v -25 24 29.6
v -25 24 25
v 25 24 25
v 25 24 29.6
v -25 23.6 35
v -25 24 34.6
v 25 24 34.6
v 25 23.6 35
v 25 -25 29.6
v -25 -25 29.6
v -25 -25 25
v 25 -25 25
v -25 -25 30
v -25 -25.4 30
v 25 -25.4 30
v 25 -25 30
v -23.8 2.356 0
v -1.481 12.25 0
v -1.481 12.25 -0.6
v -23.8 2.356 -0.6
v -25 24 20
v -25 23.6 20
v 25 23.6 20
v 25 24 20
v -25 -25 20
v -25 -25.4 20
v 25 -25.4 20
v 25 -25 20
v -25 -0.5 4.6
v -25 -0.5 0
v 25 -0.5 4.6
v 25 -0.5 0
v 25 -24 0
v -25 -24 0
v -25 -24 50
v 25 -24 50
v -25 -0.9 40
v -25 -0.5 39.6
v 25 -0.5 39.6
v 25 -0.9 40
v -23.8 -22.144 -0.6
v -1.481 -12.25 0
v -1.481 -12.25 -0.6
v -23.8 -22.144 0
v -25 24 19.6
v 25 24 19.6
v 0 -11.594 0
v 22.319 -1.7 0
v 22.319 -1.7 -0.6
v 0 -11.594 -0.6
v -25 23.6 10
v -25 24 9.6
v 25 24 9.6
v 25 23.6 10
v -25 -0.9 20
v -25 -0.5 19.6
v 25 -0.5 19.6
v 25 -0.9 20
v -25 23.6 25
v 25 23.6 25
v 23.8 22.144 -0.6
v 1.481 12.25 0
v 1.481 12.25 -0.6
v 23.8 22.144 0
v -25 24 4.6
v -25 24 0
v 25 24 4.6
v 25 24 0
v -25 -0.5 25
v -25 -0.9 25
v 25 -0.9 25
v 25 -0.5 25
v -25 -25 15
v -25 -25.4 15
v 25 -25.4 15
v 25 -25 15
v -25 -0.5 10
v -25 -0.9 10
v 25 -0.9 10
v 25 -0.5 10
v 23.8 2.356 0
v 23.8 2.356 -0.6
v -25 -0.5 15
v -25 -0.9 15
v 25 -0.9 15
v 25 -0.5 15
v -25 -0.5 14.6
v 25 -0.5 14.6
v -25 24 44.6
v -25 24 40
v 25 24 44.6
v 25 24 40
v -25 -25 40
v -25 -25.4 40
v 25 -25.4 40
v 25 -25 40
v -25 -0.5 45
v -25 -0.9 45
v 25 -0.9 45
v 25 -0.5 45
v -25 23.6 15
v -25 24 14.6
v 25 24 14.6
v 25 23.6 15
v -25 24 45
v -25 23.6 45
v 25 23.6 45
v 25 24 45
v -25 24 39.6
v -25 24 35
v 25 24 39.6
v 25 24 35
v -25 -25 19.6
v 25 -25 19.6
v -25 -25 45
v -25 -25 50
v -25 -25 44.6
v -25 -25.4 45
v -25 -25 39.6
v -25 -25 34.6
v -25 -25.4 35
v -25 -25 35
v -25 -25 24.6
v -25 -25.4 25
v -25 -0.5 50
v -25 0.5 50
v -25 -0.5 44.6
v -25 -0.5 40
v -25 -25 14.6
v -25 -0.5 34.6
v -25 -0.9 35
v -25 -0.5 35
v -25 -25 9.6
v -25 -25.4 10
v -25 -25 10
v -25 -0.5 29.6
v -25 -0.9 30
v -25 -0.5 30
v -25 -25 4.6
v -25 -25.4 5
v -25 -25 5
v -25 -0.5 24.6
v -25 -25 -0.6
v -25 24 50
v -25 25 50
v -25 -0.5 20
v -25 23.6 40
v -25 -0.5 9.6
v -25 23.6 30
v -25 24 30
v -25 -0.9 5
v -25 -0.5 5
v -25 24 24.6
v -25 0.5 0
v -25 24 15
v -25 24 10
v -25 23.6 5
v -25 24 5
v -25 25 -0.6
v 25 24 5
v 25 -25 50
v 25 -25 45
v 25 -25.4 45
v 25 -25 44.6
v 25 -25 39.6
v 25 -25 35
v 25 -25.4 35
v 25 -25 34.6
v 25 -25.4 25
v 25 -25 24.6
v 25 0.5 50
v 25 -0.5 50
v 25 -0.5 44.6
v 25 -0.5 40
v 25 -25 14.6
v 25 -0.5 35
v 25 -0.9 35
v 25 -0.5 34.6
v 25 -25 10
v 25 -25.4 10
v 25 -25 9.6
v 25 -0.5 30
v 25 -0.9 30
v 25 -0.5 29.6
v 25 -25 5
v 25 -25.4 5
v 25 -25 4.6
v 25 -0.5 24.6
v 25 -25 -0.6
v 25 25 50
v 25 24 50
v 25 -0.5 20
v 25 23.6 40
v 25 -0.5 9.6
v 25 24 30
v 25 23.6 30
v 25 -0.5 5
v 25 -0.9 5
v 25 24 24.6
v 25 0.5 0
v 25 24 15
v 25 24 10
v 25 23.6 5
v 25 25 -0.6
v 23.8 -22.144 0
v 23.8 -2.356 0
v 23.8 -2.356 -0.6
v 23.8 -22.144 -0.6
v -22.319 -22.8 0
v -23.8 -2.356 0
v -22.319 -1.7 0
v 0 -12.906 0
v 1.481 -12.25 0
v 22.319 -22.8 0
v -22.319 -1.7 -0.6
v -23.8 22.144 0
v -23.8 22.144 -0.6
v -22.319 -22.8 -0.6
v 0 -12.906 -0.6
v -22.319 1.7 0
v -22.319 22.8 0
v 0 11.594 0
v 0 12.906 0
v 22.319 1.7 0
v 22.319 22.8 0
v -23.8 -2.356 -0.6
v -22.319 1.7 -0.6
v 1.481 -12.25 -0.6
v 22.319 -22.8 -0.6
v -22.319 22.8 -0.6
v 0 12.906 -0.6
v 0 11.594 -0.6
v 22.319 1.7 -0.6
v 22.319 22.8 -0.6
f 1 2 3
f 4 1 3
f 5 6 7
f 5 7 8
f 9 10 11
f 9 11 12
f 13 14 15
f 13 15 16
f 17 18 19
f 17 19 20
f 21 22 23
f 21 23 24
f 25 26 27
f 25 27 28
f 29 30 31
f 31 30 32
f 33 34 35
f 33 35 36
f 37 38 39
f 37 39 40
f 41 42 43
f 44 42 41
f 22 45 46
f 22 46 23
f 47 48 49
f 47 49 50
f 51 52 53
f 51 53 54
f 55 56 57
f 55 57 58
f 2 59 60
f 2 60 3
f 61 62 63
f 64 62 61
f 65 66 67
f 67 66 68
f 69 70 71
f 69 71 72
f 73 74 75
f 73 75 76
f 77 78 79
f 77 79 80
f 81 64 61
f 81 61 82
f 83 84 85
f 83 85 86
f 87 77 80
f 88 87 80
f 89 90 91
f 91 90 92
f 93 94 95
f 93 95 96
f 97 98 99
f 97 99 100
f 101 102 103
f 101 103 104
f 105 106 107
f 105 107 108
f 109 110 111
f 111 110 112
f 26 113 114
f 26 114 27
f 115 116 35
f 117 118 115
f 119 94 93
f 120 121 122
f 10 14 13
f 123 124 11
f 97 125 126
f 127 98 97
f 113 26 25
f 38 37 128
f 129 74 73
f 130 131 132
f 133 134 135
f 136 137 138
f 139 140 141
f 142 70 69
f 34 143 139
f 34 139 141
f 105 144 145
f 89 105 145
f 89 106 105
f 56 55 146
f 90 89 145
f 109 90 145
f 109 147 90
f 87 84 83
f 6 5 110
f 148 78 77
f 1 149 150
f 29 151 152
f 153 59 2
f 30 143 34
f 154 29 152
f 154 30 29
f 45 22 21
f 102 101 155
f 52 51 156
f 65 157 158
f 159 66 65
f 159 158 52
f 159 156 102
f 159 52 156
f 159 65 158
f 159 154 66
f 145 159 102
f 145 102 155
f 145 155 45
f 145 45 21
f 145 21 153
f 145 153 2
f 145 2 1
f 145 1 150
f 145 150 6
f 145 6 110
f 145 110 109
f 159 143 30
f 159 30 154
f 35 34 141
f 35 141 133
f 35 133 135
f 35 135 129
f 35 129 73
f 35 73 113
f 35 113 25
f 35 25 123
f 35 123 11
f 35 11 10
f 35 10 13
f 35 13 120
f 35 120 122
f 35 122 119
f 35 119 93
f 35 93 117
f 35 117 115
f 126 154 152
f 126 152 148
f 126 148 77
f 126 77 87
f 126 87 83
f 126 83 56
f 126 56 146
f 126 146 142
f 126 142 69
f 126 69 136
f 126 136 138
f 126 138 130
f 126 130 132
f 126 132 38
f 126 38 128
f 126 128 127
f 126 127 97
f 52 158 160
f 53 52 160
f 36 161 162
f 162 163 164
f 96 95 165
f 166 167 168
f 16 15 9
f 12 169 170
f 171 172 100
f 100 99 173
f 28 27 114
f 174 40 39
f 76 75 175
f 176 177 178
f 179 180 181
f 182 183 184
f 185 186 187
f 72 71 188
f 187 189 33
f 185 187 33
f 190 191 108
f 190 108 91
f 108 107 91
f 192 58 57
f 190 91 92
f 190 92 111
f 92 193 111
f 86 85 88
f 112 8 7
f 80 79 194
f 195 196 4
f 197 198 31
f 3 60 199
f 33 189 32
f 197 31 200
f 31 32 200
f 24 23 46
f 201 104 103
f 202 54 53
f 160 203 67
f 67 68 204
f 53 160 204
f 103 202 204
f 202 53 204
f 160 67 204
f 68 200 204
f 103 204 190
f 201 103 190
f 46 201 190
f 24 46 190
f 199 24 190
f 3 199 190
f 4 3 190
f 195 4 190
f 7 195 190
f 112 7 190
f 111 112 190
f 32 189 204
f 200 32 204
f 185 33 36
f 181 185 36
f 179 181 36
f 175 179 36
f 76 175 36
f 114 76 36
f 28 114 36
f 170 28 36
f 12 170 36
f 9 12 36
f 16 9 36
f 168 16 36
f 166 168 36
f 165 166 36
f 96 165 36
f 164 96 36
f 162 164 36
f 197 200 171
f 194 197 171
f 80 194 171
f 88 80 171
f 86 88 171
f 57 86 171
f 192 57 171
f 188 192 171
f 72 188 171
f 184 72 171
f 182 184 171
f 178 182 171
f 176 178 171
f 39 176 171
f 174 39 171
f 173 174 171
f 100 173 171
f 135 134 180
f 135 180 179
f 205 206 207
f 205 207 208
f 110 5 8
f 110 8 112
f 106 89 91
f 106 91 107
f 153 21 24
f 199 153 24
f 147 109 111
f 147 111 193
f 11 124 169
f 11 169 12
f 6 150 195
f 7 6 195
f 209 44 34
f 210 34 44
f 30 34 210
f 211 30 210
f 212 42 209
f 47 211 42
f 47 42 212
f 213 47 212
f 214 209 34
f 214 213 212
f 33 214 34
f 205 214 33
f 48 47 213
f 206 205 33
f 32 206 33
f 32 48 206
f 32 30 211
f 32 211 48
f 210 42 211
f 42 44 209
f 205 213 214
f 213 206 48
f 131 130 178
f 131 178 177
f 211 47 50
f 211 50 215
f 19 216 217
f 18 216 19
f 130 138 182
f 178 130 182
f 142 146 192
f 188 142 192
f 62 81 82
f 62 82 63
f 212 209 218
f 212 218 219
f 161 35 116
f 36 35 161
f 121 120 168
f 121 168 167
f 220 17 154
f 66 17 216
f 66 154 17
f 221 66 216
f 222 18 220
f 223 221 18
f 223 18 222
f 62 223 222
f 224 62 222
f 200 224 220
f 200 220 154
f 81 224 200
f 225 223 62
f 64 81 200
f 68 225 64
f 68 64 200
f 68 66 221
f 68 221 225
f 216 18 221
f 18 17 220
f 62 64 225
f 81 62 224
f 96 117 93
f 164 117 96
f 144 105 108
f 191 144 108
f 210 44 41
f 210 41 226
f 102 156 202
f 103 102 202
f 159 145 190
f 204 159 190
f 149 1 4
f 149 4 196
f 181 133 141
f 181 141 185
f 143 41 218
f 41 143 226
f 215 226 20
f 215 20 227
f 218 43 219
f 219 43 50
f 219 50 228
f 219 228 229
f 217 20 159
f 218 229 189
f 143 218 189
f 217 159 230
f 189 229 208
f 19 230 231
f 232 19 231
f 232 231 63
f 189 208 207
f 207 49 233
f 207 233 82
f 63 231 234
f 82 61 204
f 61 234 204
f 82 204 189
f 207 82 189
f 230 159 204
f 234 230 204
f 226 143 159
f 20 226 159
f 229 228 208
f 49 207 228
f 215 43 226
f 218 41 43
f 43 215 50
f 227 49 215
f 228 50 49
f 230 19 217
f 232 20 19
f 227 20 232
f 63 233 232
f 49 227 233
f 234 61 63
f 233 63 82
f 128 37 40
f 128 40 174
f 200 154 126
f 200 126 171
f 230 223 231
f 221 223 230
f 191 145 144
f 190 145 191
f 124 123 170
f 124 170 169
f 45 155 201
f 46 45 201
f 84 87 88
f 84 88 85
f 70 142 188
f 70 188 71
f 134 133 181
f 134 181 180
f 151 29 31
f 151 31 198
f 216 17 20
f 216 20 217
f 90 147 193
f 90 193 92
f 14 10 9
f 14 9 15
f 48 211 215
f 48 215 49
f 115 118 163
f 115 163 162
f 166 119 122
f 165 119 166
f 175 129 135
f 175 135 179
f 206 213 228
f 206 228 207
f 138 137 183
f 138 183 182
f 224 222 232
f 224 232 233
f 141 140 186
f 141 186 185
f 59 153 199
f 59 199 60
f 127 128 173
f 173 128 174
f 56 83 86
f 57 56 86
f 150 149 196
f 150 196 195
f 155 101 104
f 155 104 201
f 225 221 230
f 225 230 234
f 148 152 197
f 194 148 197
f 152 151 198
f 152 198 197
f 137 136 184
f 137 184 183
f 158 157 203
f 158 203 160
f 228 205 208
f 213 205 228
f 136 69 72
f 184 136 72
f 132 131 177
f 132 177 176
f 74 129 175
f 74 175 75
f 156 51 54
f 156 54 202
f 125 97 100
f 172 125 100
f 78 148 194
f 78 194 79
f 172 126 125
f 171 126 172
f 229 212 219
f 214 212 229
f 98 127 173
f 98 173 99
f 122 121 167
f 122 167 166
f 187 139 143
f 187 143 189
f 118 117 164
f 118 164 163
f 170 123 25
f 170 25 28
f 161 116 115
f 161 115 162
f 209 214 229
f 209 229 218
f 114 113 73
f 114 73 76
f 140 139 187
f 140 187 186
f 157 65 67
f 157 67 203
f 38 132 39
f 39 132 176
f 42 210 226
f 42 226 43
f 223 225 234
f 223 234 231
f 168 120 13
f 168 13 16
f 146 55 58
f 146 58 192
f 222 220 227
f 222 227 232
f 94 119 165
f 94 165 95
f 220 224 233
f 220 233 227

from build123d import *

# Parameters (mm, degrees)
F0_W     = 50
F0_H     = 23.5
F0_H_2   = 1
F1_DEPTH = 0.6
F2_DEPTH = 50
F4_DEPTH = 50


# Not quite as in the source:
# - a feature names something its author has since deleted; it is built from what else it names


with BuildPart() as f1:
    # F0 (on Top) → F1 (new body)
    with BuildSketch(Plane.XY):
        with Locations((0, 12.25)):
            Rectangle(F0_W, F0_H)
        Polygon((-23.8, 22.1436935786), (-23.8, 22.8), (-22.3194224806, 22.8), (22.3194224806, 22.8), (23.8, 22.8), (23.8, 22.1436935786), (23.8, 2.3563064214), (23.8, 1.7), (22.3194224806, 1.7), (-22.3194224806, 1.7), (-23.8, 1.7), (-23.8, 2.3563064214), align=None, mode=Mode.SUBTRACT)
        with Locations((0, -12.25)):
            Rectangle(F0_W, F0_H)
        Polygon((-22.3194224806, -22.8), (-23.8, -22.8), (-23.8, -22.1436935786), (-23.8, -2.3563064214), (-23.8, -1.7), (-22.3194224806, -1.7), (22.3194224806, -1.7), (23.8, -1.7), (23.8, -2.3563064214), (23.8, -22.1436935786), (23.8, -22.8), (22.3194224806, -22.8), align=None, mode=Mode.SUBTRACT)
        with Locations((0, -24.5)):
            Rectangle(F0_W, F0_H_2)
        Rectangle(F0_W, F0_H_2)
        with Locations((0, 24.5)):
            Rectangle(F0_W, F0_H_2)
        Polygon((-22.3194224806, 22.8), (-23.8, 22.8), (-23.8, 22.1436935786), (-1.4805775194, 12.25), (0, 12.9063064214), align=None)
        Polygon((23.8, 22.8), (22.3194224806, 22.8), (0, 12.9063064214), (1.4805775194, 12.25), (23.8, 22.1436935786), align=None)
        Polygon((1.4805775194, 12.25), (0, 12.9063064214), (-1.4805775194, 12.25), (0, 11.5936935786), align=None)
        Polygon((23.8, 2.3563064214), (1.4805775194, 12.25), (0, 11.5936935786), (22.3194224806, 1.7), (23.8, 1.7), align=None)
        Polygon((-1.4805775194, 12.25), (-23.8, 2.3563064214), (-23.8, 1.7), (-22.3194224806, 1.7), (0, 11.5936935786), align=None)
        Polygon((-23.8, -1.7), (-23.8, -2.3563064214), (-1.4805775194, -12.25), (0, -11.5936935786), (-22.3194224806, -1.7), align=None)
        Polygon((0, -11.5936935786), (-1.4805775194, -12.25), (0, -12.9063064214), (1.4805775194, -12.25), align=None)
        Polygon((22.3194224806, -1.7), (0, -11.5936935786), (1.4805775194, -12.25), (23.8, -2.3563064214), (23.8, -1.7), align=None)
        Polygon((0, -12.9063064214), (22.3194224806, -22.8), (23.8, -22.8), (23.8, -22.1436935786), (1.4805775194, -12.25), align=None)
        Polygon((-23.8, -22.1436935786), (-23.8, -22.8), (-22.3194224806, -22.8), (0, -12.9063064214), (-1.4805775194, -12.25), align=None)
    extrude(amount=-F1_DEPTH)

    # F0 (on Top) → F2 (join)
    with BuildSketch(Plane.XY):
        with Locations((0, 24.5)):
            Rectangle(F0_W, F0_H_2)
        Rectangle(F0_W, F0_H_2)
        with Locations((0, -24.5)):
            Rectangle(F0_W, F0_H_2)
    extrude(amount=F2_DEPTH)

    # F3 (on face) → F4 (join, through all)
    with BuildSketch(Plane(origin=(-25, 0, 0), x_dir=(0, -1, 0), z_dir=(-1, 0, 0))):
        Polygon((-24, 45), (-24, 44.6), (-23.6, 45), align=None)
        Polygon((-24, 40), (-24, 39.6), (-23.6, 40), align=None)
        Polygon((-24, 35), (-24, 34.6), (-23.6, 35), align=None)
        Polygon((-24, 30), (-24, 29.6), (-23.6, 30), align=None)
        Polygon((-24, 25), (-24, 24.6), (-23.6, 25), align=None)
        Polygon((-24, 20), (-24, 19.6), (-23.6, 20), align=None)
        Polygon((-24, 15), (-24, 14.6), (-23.6, 15), align=None)
        Polygon((-24, 10), (-24, 9.6), (-23.6, 10), align=None)
        Polygon((-24, 5), (-24, 4.6), (-23.6, 5), align=None)
        Polygon((0.9, 5), (0.5, 5), (0.5, 4.6), align=None)
        Polygon((0.9, 10), (0.5, 10), (0.5, 9.6), align=None)
        Polygon((0.9, 15), (0.5, 15), (0.5, 14.6), align=None)
        Polygon((0.9, 20), (0.5, 20), (0.5, 19.6), align=None)
        Polygon((0.9, 25), (0.5, 25), (0.5, 24.6), align=None)
        Polygon((0.9, 30), (0.5, 30), (0.5, 29.6), align=None)
        Polygon((0.9, 35), (0.5, 35), (0.5, 34.6), align=None)
        Polygon((0.9, 40), (0.5, 40), (0.5, 39.6), align=None)
        Polygon((0.9, 45), (0.5, 45), (0.5, 44.6), align=None)
        Polygon((25.4, 45), (25, 45), (25, 44.6), align=None)
        Polygon((25.4, 40), (25, 40), (25, 39.6), align=None)
        Polygon((25.4, 35), (25, 35), (25, 34.6), align=None)
        Polygon((25, 30), (25, 29.6), (25.4, 30), align=None)
        Polygon((25, 25), (25, 24.6), (25.4, 25), align=None)
        Polygon((25, 20), (25, 19.6), (25.4, 20), align=None)
        Polygon((25, 15), (25, 14.6), (25.4, 15), align=None)
        Polygon((25, 10), (25, 9.6), (25.4, 10), align=None)
        Polygon((25, 5), (25, 4.6), (25.4, 5), align=None)
    extrude(amount=-F4_DEPTH)


solid = f1.part
